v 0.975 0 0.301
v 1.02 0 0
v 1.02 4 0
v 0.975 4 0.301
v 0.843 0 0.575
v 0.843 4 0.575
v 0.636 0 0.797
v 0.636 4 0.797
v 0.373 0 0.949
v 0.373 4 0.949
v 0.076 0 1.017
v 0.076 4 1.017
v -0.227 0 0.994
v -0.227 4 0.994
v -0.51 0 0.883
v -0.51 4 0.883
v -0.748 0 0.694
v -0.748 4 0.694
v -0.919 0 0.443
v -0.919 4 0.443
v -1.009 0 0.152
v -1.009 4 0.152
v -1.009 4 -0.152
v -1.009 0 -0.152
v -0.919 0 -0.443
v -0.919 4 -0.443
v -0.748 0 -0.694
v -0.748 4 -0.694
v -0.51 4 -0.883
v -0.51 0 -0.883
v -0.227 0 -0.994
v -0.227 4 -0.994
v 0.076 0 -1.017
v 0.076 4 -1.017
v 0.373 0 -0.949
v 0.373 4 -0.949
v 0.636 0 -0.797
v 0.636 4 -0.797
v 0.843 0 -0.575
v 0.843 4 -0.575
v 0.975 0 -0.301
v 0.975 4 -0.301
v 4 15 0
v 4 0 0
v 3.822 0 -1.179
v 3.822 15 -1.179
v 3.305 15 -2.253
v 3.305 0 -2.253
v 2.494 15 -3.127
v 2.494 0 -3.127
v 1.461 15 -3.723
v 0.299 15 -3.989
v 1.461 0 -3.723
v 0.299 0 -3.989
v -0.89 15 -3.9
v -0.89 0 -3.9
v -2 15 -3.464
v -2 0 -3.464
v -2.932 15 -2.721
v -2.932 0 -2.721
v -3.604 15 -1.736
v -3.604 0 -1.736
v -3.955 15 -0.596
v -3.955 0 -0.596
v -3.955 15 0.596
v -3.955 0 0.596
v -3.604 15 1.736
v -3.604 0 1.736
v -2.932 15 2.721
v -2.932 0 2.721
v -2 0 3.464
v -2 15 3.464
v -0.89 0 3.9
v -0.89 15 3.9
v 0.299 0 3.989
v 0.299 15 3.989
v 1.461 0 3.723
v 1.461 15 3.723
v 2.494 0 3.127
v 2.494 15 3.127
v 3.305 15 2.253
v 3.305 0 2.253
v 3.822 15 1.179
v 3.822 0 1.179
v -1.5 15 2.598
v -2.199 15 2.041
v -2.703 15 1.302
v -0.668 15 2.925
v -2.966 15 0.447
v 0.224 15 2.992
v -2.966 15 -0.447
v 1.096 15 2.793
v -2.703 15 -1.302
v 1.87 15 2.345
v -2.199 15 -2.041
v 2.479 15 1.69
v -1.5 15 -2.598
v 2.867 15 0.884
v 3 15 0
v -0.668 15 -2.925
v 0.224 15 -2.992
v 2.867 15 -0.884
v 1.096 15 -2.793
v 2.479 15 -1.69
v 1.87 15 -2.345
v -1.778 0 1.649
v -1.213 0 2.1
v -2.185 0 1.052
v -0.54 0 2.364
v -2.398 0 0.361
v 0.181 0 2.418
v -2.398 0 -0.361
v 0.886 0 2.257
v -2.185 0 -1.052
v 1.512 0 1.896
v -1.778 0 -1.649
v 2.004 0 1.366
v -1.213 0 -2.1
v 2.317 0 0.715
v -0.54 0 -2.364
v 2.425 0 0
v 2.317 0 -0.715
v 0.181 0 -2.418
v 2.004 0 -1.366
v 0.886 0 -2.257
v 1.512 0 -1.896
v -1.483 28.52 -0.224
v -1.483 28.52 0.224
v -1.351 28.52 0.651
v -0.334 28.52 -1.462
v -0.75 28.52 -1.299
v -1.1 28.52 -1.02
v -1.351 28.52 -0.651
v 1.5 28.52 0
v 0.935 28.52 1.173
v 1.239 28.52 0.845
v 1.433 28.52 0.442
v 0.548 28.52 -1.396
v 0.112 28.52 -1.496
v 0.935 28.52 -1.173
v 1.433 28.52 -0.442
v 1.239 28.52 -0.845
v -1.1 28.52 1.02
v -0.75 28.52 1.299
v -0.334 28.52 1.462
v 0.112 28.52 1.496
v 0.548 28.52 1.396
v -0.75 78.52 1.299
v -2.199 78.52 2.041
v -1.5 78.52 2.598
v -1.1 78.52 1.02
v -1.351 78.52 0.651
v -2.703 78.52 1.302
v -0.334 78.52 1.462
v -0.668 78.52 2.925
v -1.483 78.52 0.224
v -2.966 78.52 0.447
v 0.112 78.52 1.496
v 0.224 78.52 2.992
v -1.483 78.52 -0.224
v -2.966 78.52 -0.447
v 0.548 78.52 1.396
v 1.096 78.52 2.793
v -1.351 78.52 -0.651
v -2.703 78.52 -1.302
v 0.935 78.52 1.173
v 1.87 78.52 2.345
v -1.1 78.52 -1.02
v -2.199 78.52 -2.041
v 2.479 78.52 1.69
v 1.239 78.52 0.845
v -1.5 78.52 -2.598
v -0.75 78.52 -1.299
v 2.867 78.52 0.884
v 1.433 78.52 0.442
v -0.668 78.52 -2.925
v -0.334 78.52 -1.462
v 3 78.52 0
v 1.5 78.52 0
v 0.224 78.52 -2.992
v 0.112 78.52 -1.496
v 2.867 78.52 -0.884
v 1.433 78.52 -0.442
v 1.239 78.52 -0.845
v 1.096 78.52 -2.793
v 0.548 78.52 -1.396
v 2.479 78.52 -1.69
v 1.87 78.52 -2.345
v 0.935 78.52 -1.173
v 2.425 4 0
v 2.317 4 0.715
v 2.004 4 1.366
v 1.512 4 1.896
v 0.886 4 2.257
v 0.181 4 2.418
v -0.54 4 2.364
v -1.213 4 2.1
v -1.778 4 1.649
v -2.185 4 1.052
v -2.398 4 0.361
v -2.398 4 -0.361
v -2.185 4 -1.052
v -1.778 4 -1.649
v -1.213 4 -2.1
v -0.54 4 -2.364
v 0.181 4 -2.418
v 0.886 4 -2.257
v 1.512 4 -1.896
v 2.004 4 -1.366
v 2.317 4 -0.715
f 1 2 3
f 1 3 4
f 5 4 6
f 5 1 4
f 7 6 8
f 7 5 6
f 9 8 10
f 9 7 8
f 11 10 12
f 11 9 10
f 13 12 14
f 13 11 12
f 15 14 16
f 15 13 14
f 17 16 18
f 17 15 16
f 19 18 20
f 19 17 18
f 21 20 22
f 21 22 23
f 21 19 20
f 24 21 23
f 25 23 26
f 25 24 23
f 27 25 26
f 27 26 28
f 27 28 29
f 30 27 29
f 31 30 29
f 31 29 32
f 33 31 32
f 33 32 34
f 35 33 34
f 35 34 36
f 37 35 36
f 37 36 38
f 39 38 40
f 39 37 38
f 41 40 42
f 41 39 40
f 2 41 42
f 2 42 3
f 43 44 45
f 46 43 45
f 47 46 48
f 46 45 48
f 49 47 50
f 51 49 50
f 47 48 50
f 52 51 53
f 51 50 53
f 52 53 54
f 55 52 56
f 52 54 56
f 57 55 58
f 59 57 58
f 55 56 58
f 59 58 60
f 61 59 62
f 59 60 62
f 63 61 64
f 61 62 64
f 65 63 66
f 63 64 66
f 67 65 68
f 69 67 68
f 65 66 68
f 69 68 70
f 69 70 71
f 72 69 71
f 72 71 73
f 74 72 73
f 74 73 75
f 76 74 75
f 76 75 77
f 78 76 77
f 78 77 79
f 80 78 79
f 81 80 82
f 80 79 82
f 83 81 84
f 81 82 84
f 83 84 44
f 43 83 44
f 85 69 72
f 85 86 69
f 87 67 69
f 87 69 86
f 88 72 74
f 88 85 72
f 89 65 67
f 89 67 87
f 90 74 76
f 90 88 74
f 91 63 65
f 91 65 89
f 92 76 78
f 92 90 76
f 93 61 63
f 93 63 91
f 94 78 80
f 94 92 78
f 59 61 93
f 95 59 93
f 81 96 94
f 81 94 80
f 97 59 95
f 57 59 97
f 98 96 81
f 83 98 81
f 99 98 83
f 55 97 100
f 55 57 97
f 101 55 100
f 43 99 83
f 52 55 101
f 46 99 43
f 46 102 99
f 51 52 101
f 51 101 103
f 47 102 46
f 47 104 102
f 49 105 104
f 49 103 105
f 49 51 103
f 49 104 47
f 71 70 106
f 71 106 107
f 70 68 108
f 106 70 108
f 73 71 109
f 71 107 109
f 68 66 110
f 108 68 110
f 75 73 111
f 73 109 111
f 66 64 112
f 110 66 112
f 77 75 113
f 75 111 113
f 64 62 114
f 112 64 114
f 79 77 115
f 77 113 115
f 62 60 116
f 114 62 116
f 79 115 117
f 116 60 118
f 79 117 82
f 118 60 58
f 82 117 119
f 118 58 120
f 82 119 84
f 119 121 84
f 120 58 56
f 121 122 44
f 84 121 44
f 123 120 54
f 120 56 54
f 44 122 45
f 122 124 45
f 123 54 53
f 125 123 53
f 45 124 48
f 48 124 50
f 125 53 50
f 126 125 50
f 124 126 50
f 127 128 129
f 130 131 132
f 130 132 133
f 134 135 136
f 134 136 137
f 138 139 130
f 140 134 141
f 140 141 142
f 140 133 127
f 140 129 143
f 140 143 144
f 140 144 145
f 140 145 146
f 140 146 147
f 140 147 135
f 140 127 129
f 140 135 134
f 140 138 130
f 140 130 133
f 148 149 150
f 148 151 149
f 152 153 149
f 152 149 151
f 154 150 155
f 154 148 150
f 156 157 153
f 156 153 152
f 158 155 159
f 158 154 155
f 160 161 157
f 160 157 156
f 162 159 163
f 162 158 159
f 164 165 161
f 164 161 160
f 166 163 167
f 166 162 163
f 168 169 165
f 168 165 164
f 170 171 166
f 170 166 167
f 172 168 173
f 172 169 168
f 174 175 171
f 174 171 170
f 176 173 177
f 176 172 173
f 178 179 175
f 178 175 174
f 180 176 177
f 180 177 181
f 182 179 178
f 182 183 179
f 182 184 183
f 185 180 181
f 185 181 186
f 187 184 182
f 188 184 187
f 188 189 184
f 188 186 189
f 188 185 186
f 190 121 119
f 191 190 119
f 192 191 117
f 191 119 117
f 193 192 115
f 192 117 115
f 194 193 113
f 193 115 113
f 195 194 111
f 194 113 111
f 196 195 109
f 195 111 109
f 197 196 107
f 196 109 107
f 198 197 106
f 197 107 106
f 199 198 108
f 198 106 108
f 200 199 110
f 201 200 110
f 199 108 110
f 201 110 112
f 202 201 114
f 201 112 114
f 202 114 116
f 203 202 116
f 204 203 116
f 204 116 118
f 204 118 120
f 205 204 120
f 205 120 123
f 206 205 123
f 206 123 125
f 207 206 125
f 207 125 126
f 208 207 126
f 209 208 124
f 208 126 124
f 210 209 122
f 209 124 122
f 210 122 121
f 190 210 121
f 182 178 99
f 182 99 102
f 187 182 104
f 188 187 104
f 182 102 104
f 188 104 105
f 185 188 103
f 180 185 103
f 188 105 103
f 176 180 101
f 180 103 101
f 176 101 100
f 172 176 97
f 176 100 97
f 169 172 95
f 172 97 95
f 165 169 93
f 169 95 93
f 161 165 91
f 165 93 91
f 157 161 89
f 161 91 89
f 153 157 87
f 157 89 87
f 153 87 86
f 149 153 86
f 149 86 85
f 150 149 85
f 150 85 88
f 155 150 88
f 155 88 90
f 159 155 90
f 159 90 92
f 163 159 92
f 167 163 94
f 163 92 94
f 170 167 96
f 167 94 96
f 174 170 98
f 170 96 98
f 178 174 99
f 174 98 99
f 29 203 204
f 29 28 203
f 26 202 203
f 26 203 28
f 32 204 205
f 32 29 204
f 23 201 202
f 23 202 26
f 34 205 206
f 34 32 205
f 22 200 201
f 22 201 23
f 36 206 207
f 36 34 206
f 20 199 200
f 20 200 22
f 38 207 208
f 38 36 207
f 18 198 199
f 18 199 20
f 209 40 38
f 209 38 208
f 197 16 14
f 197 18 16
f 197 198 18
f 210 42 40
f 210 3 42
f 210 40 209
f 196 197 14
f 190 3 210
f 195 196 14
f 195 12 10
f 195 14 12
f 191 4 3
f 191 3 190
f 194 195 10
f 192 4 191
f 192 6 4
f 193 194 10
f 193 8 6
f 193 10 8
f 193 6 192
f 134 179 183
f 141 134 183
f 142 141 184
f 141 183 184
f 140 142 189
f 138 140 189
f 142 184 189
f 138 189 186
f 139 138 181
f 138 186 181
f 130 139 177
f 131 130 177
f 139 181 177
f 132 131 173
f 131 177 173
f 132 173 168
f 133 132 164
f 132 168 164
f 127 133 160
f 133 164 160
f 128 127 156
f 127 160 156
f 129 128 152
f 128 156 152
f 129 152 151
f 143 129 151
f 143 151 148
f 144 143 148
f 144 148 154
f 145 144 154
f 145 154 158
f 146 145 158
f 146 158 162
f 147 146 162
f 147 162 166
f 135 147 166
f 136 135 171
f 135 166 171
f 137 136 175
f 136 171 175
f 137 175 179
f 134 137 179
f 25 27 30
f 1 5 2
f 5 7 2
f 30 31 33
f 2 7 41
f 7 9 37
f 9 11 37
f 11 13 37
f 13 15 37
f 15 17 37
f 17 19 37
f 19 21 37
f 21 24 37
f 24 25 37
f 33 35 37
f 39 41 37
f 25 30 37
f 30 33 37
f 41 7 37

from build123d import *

# Parameters (mm, degrees)
SKETCH1_R           = 4
BOSS_EXTRUDE1_DEPTH = 15
SKETCH2_R           = 3
BOSS_EXTRUDE2_DEPTH = 59.52
SKETCH3_R           = 2.425
SKETCH3_R_2         = 1.02
CUT_EXTRUDE1_DEPTH  = 4
SKETCH4_R           = 3
BOSS_EXTRUDE3_DEPTH = 4
SKETCH5_R           = 1.5
CUT_EXTRUDE2_DEPTH  = 50


with BuildPart() as part:
    # Sketch1 → Boss-Extrude1 (new body)
    with BuildSketch(Plane(origin=(0, 0, 0), x_dir=(1, 0, 0), z_dir=(0, 1, 0))):
        Circle(SKETCH1_R)
    extrude(amount=BOSS_EXTRUDE1_DEPTH)

    # Sketch2 → Boss-Extrude2 (add)
    with BuildSketch(Plane(origin=(0, 15, 0), x_dir=(1, 0, 0), z_dir=(0, 1, 0))):
        Circle(SKETCH2_R)
    extrude(amount=BOSS_EXTRUDE2_DEPTH)

    # Sketch3 → Cut-Extrude1 (cut)
    with BuildSketch(Plane.XZ):
        Circle(SKETCH3_R)
        Circle(SKETCH3_R_2, mode=Mode.SUBTRACT)
    extrude(amount=-CUT_EXTRUDE1_DEPTH, mode=Mode.SUBTRACT)

    # Sketch4 → Boss-Extrude3 (add)
    with BuildSketch(Plane(origin=(0, 74.52, 0), x_dir=(1, 0, 0), z_dir=(0, 1, 0))):
        Circle(SKETCH4_R)
    extrude(amount=BOSS_EXTRUDE3_DEPTH)

    # Sketch5 → Cut-Extrude2 (cut)
    with BuildSketch(Plane(origin=(0, 78.52, 0), x_dir=(1, 0, 0), z_dir=(0, 1, 0))):
        Circle(SKETCH5_R)
    extrude(amount=-CUT_EXTRUDE2_DEPTH, mode=Mode.SUBTRACT)


solid = part.part
